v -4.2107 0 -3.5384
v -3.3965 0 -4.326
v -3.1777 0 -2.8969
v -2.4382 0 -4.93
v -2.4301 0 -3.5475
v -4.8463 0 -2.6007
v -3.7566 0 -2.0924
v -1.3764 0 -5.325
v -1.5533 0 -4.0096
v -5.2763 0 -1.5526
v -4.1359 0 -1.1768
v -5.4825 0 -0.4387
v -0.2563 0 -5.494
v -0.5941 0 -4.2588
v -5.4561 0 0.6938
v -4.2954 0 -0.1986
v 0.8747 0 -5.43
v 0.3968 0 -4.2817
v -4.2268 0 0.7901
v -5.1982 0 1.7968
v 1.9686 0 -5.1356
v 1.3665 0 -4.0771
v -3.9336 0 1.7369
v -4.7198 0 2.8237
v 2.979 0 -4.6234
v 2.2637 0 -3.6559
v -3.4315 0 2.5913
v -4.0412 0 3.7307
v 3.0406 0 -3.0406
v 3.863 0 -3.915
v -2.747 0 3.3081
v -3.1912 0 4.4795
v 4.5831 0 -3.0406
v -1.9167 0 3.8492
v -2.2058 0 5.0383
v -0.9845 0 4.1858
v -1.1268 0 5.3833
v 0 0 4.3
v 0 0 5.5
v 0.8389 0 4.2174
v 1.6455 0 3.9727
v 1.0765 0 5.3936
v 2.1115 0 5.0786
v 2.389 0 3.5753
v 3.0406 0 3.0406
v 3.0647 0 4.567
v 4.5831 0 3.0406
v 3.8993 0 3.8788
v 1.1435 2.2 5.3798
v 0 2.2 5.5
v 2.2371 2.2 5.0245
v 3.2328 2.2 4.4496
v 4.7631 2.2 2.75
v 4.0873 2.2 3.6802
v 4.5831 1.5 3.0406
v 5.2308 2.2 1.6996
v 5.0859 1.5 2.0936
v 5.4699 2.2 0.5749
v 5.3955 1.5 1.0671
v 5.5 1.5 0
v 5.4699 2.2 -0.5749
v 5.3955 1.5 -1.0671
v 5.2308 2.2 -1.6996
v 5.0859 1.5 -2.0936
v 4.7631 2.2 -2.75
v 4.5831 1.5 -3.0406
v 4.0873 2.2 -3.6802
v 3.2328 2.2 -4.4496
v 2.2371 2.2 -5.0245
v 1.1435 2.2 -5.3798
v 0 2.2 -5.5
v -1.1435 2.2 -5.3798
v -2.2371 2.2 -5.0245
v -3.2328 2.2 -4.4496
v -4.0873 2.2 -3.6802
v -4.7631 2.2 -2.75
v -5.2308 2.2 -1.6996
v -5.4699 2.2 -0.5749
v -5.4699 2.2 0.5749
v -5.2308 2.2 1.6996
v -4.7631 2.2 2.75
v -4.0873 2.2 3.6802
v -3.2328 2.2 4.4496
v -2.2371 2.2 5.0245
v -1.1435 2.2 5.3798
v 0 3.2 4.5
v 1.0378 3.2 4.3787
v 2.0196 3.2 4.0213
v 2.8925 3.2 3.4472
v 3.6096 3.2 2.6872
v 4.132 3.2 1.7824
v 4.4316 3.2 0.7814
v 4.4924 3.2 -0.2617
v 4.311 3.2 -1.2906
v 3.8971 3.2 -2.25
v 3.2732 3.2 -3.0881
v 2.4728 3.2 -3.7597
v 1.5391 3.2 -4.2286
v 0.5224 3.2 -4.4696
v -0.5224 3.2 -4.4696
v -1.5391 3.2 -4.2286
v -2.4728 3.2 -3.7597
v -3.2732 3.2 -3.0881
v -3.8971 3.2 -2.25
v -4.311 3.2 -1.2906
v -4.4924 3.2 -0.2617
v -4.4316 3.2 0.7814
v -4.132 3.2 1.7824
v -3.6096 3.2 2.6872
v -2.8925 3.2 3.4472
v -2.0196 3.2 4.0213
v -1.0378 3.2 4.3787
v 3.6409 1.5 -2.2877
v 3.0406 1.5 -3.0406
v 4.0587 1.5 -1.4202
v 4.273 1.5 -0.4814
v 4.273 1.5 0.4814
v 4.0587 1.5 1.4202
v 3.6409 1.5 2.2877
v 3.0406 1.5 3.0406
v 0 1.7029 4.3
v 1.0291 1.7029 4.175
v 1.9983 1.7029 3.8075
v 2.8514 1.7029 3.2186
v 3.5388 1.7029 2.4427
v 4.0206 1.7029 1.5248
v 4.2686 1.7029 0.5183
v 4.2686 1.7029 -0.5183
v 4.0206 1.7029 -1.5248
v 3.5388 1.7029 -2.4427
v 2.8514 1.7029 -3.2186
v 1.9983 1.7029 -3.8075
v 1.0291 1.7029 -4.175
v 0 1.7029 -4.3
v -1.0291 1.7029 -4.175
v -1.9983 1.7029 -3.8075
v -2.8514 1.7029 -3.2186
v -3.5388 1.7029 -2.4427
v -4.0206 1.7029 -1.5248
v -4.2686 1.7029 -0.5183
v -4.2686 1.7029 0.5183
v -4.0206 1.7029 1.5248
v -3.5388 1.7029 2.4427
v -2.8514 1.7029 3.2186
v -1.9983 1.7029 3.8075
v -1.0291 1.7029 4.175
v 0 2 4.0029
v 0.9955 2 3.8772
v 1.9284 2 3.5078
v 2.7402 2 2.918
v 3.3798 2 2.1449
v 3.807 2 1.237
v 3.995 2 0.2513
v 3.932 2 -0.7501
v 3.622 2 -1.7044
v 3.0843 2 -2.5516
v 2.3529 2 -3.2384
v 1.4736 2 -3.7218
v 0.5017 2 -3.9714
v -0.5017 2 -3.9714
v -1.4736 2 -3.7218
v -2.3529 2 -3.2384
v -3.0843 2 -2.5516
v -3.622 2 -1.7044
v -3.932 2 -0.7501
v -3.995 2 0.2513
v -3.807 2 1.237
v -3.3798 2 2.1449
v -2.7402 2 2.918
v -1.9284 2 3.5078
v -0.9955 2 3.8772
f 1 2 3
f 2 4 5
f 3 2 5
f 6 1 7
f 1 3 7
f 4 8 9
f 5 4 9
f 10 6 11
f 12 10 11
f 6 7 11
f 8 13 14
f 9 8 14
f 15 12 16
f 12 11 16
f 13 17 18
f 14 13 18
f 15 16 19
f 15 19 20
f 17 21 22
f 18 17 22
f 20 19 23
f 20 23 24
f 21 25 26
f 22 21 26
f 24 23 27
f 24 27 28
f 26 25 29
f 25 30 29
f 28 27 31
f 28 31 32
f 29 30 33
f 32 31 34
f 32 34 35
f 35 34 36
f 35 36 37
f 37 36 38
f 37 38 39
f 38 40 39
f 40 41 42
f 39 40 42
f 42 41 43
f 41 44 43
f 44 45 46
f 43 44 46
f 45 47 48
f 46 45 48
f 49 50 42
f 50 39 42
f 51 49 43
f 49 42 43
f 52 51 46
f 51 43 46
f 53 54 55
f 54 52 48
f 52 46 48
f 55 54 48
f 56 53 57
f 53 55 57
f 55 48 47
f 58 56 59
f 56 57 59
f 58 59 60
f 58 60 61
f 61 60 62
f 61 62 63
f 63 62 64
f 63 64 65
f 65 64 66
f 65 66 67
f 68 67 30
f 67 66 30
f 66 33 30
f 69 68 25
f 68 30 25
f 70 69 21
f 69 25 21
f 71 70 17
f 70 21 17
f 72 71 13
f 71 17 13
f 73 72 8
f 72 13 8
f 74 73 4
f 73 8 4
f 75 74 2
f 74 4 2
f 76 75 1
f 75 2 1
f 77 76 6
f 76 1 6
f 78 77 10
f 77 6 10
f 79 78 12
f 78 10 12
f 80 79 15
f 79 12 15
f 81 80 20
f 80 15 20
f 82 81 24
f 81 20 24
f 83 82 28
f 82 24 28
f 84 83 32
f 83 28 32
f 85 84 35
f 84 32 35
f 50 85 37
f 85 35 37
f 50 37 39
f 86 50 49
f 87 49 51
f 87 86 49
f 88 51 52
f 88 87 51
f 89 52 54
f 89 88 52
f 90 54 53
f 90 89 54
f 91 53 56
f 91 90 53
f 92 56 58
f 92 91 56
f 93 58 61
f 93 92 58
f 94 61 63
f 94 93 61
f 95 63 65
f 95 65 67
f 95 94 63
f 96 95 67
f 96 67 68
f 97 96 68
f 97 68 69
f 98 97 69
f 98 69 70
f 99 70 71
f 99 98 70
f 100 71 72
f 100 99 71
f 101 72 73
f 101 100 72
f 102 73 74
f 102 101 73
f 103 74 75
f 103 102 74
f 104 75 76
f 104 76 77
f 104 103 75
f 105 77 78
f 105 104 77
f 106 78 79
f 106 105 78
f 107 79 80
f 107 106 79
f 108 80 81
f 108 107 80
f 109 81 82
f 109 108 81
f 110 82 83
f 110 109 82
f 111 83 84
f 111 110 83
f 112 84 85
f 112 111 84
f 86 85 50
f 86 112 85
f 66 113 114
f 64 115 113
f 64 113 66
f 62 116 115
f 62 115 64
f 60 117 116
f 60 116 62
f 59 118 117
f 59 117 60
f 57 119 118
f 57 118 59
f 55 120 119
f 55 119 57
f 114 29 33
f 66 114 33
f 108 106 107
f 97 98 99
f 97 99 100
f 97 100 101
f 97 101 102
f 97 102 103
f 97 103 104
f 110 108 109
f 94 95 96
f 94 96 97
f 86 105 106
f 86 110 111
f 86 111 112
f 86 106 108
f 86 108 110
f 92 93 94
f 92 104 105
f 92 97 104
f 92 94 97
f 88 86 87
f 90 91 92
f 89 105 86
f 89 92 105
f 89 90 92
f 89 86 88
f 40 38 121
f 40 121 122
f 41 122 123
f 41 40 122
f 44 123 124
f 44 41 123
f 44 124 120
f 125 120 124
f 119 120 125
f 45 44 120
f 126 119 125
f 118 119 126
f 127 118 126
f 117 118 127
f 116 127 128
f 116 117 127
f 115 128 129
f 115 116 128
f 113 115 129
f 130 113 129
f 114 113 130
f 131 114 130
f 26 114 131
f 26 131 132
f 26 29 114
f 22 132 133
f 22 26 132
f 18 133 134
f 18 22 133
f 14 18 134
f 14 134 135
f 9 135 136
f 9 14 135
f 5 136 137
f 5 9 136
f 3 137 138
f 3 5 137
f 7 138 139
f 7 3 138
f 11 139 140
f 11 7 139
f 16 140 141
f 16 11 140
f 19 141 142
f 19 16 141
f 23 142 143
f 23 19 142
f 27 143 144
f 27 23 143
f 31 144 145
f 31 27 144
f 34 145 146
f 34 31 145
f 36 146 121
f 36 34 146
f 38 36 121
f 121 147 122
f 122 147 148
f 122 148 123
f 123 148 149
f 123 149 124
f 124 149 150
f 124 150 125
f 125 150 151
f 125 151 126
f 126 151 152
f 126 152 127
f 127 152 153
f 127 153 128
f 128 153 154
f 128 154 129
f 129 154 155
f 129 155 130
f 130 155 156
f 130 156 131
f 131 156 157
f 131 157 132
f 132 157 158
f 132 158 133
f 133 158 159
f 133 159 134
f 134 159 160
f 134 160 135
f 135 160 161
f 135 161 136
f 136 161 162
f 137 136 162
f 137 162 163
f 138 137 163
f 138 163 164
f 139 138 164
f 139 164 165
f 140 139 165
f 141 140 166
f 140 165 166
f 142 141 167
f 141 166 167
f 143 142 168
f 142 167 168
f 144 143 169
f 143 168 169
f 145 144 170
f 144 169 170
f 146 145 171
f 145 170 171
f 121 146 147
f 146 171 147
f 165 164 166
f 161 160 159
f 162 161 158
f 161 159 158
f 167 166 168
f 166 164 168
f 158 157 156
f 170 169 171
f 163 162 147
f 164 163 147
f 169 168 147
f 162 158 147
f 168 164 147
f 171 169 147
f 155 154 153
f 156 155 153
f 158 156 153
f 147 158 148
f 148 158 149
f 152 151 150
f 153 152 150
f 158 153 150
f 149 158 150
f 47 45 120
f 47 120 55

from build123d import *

# Parameters (mm, degrees)
SKETCH1_R           = 5.5
BOSS_EXTRUDE1_DEPTH = 3.2
CHAMFER2_SIZE       = 1
SHELL1_T            = -1.2
SKETCH4_W           = 6.081118318
SKETCH4_H           = 6.081118318
CUT_EXTRUDE1_DEPTH  = 1.5


with BuildPart() as part:
    # Sketch1 → Boss-Extrude1 (new body)
    with BuildSketch(Plane(origin=(0, 0, 0), x_dir=(1, 0, 0), z_dir=(0, 1, 0))):
        with Locations(Location((0, 0, 0), (0, 0, 270))):
            Circle(SKETCH1_R)
    extrude(amount=BOSS_EXTRUDE1_DEPTH)

    # Chamfer2
    chamfer2_edges = [part.edges().sort_by_distance(p)[0] for p in [
        (0, 3.2, -5.5),
    ]]
    chamfer(chamfer2_edges, length=CHAMFER2_SIZE)

    # Shell1
    shell1_openings = [part.faces().sort_by_distance(p)[0] for p in [
        (0, 0, 0),
    ]]
    offset(amount=SHELL1_T, openings=shell1_openings, kind=Kind.INTERSECTION)

    # Sketch4 → Cut-Extrude1 (cut)
    with BuildSketch(Plane.XZ):
        with Locations((6.081118318, 0)):
            Rectangle(SKETCH4_W, SKETCH4_H)
    extrude(amount=-CUT_EXTRUDE1_DEPTH, mode=Mode.SUBTRACT)


solid = part.part
